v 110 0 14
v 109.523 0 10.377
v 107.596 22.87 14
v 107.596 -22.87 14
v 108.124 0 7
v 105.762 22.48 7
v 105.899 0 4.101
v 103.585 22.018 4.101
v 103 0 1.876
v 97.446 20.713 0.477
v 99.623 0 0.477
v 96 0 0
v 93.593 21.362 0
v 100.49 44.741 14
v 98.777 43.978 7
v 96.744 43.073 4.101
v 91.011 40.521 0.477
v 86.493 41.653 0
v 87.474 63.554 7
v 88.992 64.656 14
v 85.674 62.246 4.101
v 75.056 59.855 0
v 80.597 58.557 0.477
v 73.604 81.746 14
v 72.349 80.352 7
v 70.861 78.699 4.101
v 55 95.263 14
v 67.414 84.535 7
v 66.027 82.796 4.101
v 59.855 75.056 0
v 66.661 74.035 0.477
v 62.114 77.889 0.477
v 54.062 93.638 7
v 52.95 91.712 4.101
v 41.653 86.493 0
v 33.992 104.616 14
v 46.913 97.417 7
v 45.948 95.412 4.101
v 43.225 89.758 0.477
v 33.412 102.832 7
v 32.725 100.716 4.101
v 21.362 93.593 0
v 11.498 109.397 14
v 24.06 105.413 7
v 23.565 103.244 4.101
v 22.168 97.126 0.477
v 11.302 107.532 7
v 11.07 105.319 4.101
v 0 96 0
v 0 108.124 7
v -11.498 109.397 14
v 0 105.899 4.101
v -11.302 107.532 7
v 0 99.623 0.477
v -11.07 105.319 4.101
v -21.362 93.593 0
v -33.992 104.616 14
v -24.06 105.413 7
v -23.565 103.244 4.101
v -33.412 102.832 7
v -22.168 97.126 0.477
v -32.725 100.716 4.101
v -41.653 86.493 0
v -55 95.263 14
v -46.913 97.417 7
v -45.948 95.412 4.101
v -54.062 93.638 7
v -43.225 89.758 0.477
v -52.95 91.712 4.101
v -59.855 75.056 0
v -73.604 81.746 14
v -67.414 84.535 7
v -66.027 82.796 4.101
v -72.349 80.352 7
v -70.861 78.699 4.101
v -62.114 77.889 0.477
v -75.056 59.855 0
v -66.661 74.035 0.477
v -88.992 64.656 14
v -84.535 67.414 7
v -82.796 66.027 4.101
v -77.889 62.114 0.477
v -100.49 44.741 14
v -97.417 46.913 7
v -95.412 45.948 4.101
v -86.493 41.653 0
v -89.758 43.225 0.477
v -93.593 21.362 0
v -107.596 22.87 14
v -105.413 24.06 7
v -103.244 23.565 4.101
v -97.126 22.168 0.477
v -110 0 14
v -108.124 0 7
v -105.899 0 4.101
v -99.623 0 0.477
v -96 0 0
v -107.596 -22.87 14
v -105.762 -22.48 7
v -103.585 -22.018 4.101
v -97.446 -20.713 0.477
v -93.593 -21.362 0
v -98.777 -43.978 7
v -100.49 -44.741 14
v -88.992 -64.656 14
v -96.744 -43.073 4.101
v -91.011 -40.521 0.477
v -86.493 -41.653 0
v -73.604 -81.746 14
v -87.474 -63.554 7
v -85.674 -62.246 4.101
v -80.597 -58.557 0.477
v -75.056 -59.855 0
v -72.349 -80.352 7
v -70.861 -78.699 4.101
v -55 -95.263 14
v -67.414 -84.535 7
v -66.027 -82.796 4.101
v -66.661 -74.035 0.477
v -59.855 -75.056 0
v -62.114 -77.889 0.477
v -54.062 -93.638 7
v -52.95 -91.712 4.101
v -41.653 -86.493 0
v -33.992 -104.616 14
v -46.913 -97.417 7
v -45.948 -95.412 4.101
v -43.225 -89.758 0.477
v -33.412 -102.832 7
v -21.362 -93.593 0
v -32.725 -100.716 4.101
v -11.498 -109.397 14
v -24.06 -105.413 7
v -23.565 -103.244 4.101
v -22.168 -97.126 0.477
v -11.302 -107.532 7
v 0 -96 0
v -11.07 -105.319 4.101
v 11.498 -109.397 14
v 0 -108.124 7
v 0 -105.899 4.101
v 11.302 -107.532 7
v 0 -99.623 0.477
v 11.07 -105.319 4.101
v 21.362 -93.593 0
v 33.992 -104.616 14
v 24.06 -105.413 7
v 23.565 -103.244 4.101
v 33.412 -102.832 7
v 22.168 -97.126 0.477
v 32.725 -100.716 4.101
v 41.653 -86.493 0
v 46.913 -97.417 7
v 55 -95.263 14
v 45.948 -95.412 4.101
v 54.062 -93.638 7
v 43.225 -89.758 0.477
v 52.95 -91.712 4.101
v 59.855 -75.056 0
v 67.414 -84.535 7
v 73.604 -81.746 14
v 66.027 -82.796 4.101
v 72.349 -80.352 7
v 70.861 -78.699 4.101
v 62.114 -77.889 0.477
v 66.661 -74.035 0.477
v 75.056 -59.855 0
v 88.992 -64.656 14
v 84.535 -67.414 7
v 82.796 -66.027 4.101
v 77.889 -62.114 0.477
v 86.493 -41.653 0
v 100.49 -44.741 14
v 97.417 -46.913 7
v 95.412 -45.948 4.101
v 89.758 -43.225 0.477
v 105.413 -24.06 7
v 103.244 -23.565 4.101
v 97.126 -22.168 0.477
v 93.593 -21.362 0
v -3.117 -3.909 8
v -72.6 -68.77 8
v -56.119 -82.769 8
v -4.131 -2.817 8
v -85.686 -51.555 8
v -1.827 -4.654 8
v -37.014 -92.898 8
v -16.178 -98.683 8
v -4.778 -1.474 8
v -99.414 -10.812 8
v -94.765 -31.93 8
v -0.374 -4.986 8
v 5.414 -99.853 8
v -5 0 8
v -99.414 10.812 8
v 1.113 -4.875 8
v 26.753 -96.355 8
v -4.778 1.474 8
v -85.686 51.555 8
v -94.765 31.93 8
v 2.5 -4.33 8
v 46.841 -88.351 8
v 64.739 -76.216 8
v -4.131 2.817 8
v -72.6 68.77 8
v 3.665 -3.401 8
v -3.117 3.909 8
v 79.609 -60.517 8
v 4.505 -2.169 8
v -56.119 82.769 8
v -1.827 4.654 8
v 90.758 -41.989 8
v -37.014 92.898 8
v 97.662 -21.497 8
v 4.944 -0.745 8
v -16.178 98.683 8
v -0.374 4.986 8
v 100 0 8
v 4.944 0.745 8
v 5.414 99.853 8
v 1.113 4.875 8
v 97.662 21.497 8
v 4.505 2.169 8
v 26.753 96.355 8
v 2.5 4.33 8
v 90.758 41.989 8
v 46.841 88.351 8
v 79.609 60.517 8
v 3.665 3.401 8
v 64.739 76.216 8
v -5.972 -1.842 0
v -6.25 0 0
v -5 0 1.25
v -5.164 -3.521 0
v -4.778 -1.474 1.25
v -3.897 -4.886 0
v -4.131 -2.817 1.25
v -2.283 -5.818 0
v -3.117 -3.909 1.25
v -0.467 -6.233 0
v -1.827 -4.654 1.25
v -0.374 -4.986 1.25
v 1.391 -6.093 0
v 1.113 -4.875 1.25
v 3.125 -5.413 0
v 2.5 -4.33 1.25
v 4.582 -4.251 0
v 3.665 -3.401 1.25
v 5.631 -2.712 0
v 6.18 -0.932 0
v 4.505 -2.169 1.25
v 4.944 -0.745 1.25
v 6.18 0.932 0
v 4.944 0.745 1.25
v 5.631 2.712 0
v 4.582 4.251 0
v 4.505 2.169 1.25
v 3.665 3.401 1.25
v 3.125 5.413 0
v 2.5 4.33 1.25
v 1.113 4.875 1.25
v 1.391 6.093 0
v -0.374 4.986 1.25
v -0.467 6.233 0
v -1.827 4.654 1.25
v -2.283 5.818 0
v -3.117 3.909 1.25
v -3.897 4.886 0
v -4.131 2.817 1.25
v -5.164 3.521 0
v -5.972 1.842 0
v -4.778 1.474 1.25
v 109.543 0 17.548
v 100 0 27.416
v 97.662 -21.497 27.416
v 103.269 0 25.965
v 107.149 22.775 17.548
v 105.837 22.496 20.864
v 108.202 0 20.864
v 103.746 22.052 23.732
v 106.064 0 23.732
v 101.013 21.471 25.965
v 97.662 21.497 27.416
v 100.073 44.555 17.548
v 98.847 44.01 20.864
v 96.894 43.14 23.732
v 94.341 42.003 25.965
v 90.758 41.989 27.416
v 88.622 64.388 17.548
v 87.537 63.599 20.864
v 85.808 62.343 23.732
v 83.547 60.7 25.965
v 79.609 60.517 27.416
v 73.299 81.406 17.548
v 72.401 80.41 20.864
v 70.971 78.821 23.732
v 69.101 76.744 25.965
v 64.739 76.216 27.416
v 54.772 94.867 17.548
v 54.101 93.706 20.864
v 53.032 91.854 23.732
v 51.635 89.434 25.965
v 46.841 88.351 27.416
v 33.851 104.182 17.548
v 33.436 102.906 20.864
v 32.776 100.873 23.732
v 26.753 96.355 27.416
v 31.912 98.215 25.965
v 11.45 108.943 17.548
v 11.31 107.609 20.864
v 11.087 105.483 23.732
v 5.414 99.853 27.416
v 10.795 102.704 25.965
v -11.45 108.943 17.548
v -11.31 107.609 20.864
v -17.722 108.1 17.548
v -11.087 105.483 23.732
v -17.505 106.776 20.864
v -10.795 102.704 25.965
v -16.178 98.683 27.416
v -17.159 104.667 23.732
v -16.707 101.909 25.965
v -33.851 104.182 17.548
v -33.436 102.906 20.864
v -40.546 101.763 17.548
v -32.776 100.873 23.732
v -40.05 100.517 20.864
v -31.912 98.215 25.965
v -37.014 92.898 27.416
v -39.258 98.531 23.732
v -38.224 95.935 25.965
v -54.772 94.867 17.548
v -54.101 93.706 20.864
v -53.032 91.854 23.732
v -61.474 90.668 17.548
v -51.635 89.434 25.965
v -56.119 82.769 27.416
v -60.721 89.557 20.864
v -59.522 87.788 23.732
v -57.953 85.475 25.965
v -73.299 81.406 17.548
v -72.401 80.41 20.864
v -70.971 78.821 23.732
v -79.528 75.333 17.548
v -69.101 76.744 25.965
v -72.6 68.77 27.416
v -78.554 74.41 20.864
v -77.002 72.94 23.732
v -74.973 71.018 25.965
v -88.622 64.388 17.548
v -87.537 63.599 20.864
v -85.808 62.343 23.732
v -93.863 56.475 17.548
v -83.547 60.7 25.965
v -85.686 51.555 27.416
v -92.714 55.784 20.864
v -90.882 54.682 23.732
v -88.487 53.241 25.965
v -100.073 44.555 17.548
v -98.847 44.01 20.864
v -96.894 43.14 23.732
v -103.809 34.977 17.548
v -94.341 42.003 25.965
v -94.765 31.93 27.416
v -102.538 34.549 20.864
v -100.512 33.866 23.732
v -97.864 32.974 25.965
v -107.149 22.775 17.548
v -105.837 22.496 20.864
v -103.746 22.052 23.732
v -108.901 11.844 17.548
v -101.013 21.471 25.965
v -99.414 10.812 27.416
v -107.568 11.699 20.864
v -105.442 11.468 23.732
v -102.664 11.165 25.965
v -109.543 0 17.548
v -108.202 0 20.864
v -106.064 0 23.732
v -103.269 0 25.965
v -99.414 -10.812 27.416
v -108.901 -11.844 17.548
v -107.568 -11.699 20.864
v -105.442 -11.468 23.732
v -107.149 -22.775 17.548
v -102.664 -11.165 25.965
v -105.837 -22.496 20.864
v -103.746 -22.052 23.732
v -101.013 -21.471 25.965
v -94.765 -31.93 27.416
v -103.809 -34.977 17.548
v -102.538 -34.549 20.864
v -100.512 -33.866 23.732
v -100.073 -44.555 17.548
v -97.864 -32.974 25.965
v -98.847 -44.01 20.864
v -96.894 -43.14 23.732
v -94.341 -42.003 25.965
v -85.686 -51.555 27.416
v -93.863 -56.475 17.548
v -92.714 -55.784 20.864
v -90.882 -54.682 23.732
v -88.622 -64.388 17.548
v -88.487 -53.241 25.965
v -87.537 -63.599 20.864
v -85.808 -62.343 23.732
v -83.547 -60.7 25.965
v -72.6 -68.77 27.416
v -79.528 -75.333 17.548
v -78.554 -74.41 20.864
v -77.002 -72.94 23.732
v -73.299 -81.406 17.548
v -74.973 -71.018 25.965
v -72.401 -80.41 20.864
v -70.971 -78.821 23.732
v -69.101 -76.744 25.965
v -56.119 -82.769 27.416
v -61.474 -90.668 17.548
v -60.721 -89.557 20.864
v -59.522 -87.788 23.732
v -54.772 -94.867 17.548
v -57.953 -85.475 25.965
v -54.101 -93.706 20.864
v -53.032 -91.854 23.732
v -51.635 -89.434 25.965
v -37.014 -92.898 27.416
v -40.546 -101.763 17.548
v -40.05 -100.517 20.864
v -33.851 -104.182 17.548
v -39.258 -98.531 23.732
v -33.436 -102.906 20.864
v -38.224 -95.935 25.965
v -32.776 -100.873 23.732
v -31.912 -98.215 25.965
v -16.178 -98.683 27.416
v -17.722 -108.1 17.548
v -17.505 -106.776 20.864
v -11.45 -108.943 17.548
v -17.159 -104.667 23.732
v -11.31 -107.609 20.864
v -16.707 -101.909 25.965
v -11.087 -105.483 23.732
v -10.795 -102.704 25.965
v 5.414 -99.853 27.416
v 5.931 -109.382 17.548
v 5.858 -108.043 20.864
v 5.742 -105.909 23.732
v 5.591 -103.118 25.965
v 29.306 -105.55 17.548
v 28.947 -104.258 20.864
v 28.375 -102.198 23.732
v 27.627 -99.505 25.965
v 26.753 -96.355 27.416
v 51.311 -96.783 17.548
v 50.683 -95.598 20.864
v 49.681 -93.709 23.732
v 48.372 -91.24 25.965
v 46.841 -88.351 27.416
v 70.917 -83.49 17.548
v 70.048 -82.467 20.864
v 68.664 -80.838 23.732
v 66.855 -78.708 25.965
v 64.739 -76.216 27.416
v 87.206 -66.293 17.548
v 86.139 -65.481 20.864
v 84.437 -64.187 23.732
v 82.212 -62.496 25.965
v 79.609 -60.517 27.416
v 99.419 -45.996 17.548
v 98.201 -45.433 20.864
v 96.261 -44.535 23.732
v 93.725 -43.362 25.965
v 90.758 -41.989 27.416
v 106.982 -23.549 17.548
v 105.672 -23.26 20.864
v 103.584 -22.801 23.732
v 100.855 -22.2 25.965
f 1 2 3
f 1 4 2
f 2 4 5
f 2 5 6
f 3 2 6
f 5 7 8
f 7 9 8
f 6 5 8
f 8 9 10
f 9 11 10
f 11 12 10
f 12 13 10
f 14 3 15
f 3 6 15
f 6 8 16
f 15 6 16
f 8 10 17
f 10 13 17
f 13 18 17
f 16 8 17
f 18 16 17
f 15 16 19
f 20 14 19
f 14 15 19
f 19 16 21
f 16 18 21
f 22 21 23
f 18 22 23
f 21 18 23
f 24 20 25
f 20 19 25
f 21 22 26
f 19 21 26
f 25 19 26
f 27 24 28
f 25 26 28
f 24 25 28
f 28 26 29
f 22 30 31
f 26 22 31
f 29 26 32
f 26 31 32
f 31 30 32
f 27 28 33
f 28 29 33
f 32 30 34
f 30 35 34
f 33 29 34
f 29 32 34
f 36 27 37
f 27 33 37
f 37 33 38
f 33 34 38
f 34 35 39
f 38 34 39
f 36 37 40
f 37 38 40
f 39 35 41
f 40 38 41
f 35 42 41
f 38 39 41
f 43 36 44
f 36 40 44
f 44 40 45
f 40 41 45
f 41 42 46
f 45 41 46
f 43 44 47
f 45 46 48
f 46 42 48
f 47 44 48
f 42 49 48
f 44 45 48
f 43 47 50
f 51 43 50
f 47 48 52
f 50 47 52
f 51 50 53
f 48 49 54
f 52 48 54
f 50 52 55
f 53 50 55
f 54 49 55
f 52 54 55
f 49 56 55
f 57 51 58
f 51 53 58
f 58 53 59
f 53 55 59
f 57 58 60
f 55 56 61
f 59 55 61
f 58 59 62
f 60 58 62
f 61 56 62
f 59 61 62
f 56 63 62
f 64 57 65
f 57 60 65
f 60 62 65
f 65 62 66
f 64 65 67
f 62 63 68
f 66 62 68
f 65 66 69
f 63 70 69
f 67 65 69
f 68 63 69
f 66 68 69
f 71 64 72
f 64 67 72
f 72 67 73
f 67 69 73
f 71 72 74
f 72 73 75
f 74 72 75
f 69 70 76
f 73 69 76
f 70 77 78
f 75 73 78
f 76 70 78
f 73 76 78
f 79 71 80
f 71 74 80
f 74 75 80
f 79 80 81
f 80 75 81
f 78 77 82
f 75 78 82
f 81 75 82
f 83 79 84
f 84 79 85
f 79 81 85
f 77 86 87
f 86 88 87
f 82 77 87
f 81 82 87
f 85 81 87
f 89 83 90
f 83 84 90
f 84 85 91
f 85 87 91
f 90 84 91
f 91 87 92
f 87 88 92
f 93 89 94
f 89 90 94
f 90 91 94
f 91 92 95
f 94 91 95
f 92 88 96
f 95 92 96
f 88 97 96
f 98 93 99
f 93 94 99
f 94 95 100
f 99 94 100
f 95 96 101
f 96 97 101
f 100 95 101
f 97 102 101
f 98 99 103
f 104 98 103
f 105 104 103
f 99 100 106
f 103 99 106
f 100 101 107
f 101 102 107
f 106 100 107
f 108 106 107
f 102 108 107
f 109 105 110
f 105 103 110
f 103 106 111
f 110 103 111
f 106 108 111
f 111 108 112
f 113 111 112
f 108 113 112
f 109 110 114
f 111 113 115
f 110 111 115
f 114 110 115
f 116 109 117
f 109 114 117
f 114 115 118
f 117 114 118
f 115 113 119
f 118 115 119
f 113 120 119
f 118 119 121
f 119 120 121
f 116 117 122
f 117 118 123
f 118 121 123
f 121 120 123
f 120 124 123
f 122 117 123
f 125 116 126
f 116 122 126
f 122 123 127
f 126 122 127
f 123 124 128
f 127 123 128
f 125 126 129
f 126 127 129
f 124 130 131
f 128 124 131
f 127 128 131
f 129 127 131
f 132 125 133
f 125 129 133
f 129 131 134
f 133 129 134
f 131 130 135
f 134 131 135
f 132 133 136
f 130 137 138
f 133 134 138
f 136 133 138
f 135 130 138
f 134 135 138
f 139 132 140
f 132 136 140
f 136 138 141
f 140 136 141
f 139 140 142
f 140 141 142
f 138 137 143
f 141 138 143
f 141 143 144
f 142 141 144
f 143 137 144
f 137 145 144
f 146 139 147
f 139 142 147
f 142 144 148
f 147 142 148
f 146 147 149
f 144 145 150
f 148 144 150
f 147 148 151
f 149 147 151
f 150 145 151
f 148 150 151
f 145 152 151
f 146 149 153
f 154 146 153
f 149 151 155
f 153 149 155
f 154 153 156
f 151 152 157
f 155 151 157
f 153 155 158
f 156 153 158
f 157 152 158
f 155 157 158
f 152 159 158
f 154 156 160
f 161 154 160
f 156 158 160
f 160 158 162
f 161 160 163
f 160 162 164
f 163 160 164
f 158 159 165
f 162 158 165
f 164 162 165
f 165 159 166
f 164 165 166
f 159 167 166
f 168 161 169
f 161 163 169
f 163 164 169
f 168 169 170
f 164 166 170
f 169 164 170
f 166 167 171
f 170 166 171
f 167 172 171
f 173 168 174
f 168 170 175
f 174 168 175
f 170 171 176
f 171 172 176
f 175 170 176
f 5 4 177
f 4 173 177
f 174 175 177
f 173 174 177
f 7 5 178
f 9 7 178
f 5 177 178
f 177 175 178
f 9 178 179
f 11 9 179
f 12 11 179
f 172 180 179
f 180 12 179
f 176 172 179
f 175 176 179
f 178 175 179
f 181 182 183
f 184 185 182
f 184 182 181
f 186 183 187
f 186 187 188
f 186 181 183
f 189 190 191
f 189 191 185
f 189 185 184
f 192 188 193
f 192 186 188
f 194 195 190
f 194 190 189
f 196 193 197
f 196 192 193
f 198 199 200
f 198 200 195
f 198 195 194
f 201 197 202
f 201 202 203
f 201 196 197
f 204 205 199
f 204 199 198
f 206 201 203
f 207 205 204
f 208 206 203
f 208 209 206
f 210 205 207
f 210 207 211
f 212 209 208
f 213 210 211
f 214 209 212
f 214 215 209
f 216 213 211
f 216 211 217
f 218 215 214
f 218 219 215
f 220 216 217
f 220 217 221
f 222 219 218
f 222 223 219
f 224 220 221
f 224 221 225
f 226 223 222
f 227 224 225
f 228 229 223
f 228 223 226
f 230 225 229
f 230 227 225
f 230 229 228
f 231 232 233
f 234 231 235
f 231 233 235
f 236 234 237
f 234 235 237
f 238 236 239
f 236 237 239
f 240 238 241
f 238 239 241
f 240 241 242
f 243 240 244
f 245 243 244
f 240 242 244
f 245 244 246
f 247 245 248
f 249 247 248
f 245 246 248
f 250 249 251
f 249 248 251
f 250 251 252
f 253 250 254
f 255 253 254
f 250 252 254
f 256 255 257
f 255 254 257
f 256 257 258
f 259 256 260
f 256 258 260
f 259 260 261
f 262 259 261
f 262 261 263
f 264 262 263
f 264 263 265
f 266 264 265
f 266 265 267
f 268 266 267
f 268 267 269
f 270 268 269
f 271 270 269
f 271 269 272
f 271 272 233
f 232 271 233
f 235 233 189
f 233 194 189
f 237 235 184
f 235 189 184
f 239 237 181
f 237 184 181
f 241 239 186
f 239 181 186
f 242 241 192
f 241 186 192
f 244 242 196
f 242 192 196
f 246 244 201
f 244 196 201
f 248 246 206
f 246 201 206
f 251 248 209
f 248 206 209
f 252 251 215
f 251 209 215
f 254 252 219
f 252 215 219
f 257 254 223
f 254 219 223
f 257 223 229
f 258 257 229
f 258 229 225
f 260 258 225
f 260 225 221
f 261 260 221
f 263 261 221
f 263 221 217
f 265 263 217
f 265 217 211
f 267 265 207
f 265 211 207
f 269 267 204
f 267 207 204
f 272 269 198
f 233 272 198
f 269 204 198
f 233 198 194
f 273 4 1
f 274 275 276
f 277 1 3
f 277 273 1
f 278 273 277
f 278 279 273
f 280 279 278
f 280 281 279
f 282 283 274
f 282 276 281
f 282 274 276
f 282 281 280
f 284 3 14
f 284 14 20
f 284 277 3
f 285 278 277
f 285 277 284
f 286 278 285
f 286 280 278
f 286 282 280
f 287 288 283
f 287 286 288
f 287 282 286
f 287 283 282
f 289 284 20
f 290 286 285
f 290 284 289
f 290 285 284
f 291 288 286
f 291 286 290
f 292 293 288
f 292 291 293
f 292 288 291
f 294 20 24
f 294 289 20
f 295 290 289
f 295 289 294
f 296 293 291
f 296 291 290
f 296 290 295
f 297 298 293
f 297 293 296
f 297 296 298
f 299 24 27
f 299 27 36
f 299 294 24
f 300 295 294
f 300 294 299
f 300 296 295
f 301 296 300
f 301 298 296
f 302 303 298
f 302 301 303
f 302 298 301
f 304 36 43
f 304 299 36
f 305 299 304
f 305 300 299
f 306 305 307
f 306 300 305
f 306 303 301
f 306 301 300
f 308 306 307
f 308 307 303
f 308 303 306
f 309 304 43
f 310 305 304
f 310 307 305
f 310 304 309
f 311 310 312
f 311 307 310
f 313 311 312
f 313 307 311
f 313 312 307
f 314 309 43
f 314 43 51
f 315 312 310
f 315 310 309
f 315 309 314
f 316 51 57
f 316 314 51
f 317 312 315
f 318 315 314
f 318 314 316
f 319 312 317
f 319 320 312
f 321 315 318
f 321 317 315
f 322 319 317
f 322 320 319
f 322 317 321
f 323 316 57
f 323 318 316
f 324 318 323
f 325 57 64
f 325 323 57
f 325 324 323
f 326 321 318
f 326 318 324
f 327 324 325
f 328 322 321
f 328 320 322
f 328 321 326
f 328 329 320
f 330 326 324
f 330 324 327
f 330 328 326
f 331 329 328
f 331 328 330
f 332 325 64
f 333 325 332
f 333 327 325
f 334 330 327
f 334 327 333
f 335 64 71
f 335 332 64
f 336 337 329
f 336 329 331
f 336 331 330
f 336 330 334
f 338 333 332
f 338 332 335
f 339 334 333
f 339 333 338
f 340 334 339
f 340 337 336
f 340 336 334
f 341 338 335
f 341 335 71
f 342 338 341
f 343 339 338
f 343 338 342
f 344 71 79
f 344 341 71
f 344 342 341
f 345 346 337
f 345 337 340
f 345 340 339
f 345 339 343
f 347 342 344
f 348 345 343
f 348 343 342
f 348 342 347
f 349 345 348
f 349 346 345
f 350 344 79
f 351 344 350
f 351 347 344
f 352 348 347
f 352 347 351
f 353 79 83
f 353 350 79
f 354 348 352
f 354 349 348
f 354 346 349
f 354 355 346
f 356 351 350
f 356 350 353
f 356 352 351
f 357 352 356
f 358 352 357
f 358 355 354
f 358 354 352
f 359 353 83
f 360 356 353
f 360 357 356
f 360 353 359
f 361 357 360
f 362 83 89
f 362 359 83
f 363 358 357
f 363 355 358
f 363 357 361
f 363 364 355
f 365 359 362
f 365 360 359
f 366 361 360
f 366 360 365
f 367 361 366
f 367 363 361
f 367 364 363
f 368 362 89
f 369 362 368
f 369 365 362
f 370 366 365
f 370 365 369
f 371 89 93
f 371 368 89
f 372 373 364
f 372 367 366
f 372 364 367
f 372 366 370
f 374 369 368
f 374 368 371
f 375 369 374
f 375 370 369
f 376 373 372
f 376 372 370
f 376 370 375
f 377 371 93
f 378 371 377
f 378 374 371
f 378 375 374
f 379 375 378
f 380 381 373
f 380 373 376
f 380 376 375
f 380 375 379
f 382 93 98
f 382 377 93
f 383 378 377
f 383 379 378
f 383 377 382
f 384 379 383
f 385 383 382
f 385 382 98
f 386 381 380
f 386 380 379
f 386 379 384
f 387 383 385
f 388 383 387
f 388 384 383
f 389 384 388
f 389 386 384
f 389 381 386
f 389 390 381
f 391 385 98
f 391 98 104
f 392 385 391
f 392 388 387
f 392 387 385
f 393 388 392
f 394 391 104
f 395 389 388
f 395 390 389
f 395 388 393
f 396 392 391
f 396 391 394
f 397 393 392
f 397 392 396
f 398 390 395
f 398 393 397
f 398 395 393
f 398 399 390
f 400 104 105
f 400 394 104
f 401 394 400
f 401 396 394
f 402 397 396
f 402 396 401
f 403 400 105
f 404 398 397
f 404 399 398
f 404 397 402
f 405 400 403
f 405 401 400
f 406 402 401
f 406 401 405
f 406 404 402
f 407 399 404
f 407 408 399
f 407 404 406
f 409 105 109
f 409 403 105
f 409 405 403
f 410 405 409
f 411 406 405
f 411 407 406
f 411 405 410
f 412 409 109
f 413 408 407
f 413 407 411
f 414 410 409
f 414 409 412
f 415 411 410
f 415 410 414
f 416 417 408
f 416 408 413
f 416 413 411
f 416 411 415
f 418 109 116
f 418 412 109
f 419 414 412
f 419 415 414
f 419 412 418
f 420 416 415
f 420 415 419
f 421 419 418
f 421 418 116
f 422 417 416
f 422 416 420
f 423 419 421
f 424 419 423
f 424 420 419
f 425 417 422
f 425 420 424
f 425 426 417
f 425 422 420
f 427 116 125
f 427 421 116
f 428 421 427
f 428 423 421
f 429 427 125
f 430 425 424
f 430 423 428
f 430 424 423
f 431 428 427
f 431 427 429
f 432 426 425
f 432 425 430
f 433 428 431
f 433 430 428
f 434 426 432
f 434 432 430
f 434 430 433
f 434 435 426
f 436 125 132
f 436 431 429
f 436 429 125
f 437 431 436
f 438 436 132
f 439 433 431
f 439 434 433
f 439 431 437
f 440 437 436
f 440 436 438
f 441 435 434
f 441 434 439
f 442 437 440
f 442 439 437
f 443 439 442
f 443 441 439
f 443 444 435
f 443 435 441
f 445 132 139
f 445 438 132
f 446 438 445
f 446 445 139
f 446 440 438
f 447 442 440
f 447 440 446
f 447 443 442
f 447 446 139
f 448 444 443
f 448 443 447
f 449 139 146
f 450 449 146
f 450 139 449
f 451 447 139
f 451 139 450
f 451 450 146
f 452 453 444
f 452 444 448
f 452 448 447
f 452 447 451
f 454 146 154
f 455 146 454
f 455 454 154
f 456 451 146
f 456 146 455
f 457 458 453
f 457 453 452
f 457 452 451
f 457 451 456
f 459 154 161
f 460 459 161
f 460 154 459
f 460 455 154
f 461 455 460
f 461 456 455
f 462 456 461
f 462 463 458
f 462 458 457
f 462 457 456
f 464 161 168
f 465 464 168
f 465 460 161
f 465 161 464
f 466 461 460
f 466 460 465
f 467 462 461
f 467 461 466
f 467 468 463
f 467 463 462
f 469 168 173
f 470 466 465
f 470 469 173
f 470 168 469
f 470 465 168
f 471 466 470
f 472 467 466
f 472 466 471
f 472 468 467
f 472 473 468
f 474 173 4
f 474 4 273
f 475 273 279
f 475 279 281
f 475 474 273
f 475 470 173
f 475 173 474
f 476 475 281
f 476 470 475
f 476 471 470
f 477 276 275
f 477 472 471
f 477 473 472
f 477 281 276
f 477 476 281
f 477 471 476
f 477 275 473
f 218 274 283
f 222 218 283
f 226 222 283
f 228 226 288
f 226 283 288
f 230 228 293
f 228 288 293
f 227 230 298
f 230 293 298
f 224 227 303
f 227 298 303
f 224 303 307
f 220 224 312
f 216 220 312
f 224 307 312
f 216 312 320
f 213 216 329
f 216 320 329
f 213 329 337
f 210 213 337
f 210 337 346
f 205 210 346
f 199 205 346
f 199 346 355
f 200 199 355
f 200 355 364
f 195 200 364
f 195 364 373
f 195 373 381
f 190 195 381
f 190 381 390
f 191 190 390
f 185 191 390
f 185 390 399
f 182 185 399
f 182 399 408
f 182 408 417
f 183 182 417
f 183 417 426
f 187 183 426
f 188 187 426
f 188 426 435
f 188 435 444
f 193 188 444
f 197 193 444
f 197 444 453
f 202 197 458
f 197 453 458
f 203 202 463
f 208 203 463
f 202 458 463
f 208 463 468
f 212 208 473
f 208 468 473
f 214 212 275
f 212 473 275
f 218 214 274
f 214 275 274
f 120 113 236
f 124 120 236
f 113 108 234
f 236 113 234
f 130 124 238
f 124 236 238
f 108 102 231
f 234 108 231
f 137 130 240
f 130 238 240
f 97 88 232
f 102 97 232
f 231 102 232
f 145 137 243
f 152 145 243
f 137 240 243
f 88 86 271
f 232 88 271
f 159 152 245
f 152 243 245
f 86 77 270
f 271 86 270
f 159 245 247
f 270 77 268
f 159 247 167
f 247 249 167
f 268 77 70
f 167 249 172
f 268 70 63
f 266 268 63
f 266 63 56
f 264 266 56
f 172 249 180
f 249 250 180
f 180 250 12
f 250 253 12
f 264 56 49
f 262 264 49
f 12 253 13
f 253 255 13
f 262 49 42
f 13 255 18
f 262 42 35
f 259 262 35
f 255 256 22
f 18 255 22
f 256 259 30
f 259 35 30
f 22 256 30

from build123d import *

# Parameters (mm, degrees)
F0_R           = 110
F1_DEPTH       = 28
F2_R           = 13.99999
F3_R           = 100
F4_DEPTH       = 20
F6_D           = 10
F6_CSINK_D     = 12.5
F6_CSINK_ANGLE = 90


# Not quite as in the source:
# - a fillet or chamfer is up to 0.001 mm smaller than in the source, because OpenCascade refuses the exact size


with BuildPart() as f1:
    # F0 (on Top) → F1 (new body)
    with BuildSketch(Plane.XY):
        Circle(F0_R)
    extrude(amount=F1_DEPTH)

    # F2 (radius 14 in the source; OpenCascade refuses exactly that, so slightly less here)
    f2_edges = [f1.edges().sort_by_distance(p)[0] for p in [
        (-110, 0, 28),
        (-110, 0, 0),
    ]]
    fillet(f2_edges, radius=F2_R)

    # F3 (on face) → F4 (cut)
    with BuildSketch(Plane.XY.offset(28)):
        Circle(F3_R)
    extrude(amount=-F4_DEPTH, mode=Mode.SUBTRACT)

    # F6 (through all)
    with Locations(Plane(origin=(0, 0, 0), x_dir=(1, 0, 0), z_dir=(0, 0, -1))):
        with Locations((0, 0)):
            CounterSinkHole(F6_D / 2, F6_CSINK_D / 2, counter_sink_angle=F6_CSINK_ANGLE)


solid = f1.part
